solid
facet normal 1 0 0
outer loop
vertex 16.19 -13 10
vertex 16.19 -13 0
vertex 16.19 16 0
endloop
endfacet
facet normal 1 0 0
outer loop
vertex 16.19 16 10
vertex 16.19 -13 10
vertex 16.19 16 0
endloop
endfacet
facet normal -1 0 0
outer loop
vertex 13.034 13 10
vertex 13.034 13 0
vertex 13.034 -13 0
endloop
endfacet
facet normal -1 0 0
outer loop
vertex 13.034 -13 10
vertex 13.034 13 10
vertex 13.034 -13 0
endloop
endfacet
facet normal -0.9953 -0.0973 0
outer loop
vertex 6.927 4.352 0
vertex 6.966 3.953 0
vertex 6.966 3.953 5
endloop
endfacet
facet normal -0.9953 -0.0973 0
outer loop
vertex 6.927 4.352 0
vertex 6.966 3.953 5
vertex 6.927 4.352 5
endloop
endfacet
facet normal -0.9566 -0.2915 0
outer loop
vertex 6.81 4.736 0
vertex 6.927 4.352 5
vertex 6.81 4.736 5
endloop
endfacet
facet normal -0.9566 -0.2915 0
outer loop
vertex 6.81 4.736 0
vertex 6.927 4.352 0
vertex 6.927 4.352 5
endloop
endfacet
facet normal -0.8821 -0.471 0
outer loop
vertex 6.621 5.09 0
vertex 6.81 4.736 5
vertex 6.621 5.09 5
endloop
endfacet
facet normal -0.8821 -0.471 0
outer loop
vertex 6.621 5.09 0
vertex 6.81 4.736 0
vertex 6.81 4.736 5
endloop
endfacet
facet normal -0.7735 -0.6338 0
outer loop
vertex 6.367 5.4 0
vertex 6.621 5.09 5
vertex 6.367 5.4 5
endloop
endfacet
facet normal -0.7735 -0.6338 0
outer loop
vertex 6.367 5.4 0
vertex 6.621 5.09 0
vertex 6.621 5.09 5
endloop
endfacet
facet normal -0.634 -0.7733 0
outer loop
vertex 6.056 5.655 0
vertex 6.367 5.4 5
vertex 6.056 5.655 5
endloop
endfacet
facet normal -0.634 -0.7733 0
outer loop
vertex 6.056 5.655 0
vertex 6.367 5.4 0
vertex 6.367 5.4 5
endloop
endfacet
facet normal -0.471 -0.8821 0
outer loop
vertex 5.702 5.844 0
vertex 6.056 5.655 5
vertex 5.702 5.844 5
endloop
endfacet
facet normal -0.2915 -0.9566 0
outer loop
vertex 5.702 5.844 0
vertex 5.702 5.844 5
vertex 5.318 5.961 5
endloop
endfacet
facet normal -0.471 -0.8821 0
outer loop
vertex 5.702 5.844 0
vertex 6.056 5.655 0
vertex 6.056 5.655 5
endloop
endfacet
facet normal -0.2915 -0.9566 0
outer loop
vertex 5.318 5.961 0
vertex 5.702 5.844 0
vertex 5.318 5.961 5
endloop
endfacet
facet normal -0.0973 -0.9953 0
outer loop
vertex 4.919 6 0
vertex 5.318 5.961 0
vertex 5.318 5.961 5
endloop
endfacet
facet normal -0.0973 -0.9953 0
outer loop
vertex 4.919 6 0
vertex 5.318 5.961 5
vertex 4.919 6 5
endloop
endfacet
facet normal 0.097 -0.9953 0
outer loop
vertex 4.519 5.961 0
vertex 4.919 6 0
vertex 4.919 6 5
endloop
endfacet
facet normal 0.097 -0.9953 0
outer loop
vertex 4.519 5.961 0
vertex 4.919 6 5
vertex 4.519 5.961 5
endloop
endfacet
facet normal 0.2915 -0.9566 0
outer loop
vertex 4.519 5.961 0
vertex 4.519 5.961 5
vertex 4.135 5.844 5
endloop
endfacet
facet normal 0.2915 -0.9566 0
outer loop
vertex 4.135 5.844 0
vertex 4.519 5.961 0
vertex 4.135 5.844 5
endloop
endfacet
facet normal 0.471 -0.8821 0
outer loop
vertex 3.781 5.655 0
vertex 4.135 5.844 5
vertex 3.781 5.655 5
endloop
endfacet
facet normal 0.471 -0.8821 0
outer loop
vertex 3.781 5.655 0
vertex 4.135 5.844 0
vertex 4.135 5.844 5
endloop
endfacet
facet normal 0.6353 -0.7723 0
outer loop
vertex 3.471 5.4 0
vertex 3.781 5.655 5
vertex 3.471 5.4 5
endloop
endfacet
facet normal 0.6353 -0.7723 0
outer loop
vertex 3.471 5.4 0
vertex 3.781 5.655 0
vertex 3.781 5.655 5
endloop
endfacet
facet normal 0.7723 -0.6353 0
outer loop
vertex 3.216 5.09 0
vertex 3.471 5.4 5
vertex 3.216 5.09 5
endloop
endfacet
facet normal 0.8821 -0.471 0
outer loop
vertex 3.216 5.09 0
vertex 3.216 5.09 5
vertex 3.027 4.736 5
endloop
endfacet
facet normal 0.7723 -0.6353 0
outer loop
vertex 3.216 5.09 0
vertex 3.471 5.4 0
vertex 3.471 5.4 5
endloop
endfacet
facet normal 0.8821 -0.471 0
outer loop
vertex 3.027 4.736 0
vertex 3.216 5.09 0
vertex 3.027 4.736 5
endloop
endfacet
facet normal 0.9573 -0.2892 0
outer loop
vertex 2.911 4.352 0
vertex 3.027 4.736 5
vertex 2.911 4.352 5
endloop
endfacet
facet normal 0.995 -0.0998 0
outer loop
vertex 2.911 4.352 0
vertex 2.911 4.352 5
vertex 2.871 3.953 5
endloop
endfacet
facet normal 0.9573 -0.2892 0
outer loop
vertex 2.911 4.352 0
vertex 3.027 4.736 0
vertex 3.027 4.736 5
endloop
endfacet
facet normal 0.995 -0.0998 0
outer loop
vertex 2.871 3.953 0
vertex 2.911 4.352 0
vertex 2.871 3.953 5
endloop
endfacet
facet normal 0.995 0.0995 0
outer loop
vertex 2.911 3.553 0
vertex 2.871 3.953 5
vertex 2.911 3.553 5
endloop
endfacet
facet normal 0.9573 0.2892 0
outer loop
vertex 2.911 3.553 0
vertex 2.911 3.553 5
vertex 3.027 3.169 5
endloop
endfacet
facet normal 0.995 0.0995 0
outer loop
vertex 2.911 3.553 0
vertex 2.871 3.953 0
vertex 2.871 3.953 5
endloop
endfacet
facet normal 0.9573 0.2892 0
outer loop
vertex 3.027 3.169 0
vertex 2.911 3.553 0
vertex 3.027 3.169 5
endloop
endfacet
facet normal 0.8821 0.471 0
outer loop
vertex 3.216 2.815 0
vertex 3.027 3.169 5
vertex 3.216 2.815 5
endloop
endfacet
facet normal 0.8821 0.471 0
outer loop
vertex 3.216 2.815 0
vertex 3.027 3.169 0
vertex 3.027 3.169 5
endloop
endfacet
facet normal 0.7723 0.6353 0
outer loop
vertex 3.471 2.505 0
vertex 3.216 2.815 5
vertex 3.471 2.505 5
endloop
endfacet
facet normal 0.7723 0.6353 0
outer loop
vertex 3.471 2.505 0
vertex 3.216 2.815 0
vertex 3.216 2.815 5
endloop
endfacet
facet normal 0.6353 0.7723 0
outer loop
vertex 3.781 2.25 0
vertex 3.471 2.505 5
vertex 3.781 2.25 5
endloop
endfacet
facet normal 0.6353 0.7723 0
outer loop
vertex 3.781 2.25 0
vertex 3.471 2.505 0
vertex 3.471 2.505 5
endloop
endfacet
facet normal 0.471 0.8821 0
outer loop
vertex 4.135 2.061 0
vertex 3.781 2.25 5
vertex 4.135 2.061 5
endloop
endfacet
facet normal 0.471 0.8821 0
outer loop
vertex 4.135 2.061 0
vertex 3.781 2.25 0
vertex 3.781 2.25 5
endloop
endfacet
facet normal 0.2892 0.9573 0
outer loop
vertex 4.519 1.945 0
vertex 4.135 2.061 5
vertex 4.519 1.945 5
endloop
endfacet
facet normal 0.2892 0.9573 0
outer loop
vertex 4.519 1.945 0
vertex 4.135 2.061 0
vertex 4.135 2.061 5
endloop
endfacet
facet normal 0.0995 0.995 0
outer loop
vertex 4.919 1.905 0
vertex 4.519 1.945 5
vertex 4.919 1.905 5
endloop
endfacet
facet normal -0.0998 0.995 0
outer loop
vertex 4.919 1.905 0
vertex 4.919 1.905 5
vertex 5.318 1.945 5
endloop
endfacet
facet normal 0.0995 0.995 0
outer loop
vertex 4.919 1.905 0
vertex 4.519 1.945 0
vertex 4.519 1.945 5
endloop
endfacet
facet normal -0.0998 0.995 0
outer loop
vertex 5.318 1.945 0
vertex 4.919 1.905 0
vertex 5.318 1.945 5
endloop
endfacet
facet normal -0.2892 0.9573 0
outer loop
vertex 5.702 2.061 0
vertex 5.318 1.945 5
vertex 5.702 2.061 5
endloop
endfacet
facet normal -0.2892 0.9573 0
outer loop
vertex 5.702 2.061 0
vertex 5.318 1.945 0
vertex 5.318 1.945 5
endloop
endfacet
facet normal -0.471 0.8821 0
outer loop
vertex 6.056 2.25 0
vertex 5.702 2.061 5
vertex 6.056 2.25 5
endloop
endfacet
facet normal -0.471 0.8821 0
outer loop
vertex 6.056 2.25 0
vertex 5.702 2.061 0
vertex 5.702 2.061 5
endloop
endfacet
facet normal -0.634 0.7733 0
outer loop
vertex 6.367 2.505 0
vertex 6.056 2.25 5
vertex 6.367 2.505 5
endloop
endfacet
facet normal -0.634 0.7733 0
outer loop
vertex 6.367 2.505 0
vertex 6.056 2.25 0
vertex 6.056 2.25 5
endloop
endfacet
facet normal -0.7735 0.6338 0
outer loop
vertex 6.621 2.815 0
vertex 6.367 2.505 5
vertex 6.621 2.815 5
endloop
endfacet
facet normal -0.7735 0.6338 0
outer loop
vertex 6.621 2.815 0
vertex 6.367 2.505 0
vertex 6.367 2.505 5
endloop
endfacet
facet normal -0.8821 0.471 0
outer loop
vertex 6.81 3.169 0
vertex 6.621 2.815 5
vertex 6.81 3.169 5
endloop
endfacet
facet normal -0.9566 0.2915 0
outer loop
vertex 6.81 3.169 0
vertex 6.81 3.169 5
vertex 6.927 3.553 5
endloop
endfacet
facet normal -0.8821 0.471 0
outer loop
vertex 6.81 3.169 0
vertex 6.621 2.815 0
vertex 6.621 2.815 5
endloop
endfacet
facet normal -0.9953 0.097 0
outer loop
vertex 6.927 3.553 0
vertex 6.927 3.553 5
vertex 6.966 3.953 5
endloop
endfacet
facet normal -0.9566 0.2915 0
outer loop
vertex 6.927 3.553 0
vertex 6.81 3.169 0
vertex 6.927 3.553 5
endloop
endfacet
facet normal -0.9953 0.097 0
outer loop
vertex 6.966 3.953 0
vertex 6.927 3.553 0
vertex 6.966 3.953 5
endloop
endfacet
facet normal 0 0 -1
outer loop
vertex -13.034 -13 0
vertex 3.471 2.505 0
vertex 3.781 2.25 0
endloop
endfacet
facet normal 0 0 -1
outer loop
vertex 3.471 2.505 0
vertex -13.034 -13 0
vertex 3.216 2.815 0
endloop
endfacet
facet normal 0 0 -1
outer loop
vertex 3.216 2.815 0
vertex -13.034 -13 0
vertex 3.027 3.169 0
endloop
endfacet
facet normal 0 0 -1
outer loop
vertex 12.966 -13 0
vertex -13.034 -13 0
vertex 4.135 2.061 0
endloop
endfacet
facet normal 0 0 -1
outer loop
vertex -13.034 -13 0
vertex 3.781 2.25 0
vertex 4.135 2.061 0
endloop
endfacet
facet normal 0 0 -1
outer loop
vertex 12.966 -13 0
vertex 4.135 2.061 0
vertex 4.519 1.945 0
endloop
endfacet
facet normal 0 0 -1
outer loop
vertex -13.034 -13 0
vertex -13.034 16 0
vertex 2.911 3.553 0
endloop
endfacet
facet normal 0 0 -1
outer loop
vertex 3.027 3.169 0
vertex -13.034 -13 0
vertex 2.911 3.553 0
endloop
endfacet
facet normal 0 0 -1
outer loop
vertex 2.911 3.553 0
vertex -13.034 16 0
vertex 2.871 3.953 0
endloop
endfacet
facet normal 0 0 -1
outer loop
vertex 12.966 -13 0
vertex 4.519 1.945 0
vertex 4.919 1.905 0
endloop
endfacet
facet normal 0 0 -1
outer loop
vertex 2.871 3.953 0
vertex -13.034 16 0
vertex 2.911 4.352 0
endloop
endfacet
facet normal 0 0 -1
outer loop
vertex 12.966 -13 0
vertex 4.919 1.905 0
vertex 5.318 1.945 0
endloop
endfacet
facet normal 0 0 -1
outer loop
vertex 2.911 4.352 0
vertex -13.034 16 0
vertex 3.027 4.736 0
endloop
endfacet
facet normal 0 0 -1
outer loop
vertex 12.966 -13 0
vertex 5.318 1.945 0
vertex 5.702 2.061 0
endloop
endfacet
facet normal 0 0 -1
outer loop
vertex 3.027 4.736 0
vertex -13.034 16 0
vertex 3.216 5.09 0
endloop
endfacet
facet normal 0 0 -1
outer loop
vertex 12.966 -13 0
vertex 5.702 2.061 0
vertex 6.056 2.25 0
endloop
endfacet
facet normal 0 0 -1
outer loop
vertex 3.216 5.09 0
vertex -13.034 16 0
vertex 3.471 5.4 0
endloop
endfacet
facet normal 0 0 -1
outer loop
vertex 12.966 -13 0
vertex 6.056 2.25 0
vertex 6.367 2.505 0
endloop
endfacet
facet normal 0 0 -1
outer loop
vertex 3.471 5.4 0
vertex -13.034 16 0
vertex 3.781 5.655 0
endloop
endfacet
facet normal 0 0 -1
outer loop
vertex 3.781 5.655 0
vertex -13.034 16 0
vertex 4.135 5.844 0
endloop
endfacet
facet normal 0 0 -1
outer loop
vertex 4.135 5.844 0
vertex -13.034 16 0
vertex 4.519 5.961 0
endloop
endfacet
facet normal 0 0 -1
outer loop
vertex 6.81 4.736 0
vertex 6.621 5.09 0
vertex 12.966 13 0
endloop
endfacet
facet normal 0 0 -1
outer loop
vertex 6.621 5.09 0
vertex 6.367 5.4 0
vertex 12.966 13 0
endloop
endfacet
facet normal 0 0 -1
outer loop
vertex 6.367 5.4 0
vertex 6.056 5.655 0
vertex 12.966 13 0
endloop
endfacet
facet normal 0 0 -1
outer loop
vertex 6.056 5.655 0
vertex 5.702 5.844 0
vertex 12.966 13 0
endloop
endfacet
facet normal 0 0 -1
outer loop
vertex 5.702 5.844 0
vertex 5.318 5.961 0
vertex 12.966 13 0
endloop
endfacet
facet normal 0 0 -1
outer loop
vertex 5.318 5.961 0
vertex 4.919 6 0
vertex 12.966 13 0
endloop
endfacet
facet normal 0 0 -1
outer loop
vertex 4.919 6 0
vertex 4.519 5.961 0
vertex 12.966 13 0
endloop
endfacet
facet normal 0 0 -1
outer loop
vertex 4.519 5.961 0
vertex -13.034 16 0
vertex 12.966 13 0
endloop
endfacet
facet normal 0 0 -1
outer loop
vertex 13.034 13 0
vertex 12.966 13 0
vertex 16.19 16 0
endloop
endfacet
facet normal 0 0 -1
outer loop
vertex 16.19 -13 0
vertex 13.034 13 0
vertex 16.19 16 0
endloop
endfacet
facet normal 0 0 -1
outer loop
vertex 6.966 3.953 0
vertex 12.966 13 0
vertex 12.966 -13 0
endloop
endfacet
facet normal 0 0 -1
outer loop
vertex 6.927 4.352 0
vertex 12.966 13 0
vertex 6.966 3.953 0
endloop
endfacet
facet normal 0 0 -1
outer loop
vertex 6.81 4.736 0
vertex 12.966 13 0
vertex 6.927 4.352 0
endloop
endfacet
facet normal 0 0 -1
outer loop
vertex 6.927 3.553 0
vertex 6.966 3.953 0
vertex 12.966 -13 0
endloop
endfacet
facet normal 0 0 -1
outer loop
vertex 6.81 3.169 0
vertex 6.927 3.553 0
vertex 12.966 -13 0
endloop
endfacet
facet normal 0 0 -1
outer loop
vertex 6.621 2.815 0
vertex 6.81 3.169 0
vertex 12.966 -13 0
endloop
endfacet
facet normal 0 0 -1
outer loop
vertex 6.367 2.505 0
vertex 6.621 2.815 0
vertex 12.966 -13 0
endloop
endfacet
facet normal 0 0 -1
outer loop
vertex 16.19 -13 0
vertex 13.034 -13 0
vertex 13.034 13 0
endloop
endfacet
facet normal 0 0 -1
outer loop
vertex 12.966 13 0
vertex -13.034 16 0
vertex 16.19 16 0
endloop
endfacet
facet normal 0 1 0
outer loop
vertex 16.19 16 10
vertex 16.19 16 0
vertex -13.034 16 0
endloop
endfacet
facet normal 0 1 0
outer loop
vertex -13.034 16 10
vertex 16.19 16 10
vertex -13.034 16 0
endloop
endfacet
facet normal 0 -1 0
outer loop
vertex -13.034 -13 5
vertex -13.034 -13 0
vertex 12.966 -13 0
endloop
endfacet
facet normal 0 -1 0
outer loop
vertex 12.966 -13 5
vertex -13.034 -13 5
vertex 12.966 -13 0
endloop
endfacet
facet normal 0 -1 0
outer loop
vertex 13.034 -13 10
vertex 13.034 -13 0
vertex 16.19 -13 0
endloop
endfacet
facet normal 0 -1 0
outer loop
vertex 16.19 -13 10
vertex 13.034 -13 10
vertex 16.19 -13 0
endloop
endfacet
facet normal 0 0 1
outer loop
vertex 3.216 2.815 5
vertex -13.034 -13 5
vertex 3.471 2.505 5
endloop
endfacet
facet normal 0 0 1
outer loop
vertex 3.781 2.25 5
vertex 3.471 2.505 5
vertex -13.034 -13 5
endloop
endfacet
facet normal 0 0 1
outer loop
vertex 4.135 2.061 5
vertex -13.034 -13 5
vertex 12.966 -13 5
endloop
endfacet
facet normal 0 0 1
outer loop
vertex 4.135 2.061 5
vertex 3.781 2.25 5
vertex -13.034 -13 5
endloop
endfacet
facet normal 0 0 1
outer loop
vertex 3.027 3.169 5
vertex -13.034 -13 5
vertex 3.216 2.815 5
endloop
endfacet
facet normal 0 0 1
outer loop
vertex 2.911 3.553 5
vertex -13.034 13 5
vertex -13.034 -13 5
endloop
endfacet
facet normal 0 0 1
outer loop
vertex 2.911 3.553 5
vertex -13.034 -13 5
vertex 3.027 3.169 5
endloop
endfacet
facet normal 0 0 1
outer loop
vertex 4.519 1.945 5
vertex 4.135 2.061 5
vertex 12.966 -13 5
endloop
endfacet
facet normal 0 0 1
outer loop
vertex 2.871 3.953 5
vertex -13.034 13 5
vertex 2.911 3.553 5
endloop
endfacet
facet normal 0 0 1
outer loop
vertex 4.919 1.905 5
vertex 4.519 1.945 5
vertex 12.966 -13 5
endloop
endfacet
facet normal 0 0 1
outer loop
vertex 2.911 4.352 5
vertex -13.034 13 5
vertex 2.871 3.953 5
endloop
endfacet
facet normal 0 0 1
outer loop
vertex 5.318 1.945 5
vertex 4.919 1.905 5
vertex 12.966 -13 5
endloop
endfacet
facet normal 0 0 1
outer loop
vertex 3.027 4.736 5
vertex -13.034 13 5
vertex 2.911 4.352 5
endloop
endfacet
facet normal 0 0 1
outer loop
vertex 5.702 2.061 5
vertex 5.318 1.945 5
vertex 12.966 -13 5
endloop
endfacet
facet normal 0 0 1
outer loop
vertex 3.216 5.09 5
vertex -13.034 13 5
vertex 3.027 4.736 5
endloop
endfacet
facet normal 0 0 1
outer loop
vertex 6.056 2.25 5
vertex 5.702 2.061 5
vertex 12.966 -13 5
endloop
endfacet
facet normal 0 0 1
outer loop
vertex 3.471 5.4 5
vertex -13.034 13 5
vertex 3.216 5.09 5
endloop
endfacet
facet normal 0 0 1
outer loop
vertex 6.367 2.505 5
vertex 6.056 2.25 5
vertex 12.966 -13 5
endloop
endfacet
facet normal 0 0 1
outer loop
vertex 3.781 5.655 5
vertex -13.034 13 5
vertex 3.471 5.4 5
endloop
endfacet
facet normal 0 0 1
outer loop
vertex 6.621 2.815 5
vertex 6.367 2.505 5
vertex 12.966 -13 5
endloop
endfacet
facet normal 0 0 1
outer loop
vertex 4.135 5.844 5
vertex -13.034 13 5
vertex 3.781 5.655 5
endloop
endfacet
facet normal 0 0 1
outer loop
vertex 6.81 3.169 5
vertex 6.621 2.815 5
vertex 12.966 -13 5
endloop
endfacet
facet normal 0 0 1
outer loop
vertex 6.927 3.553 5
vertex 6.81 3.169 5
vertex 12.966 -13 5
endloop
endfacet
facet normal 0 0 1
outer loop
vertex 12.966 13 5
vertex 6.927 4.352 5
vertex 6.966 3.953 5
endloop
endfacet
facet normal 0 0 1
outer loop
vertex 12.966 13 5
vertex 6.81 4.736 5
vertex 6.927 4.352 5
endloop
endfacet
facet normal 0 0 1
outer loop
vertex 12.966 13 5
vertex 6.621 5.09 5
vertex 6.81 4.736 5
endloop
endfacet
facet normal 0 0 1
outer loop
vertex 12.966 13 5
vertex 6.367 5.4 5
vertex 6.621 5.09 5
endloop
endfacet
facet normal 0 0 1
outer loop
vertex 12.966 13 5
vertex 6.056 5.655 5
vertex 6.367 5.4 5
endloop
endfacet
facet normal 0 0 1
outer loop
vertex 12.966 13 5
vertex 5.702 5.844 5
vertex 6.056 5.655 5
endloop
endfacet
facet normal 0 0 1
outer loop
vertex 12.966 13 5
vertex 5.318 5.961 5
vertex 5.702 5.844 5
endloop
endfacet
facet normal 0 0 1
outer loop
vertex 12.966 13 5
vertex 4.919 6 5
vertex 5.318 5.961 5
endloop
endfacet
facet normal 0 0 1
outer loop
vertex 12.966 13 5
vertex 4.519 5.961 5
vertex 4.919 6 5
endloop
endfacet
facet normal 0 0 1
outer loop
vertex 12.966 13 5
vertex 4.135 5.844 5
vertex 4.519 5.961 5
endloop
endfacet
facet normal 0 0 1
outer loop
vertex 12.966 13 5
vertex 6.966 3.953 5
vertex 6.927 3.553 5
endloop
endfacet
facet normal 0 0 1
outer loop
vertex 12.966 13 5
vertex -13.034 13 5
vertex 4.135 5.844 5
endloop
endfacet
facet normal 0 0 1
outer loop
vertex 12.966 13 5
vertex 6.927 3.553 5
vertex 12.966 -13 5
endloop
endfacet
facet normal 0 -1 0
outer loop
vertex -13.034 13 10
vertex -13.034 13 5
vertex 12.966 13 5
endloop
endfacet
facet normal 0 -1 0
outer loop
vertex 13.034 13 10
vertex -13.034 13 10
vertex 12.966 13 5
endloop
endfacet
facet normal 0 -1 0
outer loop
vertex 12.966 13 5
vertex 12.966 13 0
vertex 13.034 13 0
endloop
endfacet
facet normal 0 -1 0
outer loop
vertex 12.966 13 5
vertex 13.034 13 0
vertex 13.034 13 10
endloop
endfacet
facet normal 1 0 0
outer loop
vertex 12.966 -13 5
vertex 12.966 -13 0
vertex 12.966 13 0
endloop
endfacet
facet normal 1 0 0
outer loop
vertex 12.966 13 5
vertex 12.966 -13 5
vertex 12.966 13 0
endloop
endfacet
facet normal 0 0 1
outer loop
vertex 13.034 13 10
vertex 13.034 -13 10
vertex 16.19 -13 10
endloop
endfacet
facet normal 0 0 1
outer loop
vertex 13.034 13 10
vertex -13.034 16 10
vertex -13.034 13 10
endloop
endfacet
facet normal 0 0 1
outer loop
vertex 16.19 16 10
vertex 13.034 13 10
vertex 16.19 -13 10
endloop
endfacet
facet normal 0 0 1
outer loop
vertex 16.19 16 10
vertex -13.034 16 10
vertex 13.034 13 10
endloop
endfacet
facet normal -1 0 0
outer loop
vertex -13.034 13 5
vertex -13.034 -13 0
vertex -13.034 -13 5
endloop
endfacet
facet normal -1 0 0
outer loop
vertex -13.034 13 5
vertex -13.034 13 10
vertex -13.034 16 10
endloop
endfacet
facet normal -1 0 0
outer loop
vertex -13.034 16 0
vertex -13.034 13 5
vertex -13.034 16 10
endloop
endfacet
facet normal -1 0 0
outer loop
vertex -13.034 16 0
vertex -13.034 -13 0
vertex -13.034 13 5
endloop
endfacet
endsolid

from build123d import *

# Parameters (mm, degrees)
F0_W     = 26
F0_H     = 3
F1_DEPTH = 10
F0_H_2   = 26
F0_R     = 2.04741
F2_DEPTH = 5


with BuildPart() as f1:
    # F0 (on Top) → F1 (new body)
    with BuildSketch(Plane.XY):
        Polygon((12.966245, 13), (13.033755, 13), (13.033755, -13), (16.189865, -13), (16.189865, 16), (12.966245, 16), align=None)
        with Locations((-0.033755, 14.5)):
            Rectangle(F0_W, F0_H)
    extrude(amount=F1_DEPTH)

    # F0 (on Top) → F2 (join)
    with BuildSketch(Plane.XY):
        with Locations((-0.033755, 0)):
            Rectangle(F0_W, F0_H_2)
        with Locations((4.918835, 3.95259)):
            Circle(F0_R, mode=Mode.SUBTRACT)
    extrude(amount=F2_DEPTH)


solid = f1.part
